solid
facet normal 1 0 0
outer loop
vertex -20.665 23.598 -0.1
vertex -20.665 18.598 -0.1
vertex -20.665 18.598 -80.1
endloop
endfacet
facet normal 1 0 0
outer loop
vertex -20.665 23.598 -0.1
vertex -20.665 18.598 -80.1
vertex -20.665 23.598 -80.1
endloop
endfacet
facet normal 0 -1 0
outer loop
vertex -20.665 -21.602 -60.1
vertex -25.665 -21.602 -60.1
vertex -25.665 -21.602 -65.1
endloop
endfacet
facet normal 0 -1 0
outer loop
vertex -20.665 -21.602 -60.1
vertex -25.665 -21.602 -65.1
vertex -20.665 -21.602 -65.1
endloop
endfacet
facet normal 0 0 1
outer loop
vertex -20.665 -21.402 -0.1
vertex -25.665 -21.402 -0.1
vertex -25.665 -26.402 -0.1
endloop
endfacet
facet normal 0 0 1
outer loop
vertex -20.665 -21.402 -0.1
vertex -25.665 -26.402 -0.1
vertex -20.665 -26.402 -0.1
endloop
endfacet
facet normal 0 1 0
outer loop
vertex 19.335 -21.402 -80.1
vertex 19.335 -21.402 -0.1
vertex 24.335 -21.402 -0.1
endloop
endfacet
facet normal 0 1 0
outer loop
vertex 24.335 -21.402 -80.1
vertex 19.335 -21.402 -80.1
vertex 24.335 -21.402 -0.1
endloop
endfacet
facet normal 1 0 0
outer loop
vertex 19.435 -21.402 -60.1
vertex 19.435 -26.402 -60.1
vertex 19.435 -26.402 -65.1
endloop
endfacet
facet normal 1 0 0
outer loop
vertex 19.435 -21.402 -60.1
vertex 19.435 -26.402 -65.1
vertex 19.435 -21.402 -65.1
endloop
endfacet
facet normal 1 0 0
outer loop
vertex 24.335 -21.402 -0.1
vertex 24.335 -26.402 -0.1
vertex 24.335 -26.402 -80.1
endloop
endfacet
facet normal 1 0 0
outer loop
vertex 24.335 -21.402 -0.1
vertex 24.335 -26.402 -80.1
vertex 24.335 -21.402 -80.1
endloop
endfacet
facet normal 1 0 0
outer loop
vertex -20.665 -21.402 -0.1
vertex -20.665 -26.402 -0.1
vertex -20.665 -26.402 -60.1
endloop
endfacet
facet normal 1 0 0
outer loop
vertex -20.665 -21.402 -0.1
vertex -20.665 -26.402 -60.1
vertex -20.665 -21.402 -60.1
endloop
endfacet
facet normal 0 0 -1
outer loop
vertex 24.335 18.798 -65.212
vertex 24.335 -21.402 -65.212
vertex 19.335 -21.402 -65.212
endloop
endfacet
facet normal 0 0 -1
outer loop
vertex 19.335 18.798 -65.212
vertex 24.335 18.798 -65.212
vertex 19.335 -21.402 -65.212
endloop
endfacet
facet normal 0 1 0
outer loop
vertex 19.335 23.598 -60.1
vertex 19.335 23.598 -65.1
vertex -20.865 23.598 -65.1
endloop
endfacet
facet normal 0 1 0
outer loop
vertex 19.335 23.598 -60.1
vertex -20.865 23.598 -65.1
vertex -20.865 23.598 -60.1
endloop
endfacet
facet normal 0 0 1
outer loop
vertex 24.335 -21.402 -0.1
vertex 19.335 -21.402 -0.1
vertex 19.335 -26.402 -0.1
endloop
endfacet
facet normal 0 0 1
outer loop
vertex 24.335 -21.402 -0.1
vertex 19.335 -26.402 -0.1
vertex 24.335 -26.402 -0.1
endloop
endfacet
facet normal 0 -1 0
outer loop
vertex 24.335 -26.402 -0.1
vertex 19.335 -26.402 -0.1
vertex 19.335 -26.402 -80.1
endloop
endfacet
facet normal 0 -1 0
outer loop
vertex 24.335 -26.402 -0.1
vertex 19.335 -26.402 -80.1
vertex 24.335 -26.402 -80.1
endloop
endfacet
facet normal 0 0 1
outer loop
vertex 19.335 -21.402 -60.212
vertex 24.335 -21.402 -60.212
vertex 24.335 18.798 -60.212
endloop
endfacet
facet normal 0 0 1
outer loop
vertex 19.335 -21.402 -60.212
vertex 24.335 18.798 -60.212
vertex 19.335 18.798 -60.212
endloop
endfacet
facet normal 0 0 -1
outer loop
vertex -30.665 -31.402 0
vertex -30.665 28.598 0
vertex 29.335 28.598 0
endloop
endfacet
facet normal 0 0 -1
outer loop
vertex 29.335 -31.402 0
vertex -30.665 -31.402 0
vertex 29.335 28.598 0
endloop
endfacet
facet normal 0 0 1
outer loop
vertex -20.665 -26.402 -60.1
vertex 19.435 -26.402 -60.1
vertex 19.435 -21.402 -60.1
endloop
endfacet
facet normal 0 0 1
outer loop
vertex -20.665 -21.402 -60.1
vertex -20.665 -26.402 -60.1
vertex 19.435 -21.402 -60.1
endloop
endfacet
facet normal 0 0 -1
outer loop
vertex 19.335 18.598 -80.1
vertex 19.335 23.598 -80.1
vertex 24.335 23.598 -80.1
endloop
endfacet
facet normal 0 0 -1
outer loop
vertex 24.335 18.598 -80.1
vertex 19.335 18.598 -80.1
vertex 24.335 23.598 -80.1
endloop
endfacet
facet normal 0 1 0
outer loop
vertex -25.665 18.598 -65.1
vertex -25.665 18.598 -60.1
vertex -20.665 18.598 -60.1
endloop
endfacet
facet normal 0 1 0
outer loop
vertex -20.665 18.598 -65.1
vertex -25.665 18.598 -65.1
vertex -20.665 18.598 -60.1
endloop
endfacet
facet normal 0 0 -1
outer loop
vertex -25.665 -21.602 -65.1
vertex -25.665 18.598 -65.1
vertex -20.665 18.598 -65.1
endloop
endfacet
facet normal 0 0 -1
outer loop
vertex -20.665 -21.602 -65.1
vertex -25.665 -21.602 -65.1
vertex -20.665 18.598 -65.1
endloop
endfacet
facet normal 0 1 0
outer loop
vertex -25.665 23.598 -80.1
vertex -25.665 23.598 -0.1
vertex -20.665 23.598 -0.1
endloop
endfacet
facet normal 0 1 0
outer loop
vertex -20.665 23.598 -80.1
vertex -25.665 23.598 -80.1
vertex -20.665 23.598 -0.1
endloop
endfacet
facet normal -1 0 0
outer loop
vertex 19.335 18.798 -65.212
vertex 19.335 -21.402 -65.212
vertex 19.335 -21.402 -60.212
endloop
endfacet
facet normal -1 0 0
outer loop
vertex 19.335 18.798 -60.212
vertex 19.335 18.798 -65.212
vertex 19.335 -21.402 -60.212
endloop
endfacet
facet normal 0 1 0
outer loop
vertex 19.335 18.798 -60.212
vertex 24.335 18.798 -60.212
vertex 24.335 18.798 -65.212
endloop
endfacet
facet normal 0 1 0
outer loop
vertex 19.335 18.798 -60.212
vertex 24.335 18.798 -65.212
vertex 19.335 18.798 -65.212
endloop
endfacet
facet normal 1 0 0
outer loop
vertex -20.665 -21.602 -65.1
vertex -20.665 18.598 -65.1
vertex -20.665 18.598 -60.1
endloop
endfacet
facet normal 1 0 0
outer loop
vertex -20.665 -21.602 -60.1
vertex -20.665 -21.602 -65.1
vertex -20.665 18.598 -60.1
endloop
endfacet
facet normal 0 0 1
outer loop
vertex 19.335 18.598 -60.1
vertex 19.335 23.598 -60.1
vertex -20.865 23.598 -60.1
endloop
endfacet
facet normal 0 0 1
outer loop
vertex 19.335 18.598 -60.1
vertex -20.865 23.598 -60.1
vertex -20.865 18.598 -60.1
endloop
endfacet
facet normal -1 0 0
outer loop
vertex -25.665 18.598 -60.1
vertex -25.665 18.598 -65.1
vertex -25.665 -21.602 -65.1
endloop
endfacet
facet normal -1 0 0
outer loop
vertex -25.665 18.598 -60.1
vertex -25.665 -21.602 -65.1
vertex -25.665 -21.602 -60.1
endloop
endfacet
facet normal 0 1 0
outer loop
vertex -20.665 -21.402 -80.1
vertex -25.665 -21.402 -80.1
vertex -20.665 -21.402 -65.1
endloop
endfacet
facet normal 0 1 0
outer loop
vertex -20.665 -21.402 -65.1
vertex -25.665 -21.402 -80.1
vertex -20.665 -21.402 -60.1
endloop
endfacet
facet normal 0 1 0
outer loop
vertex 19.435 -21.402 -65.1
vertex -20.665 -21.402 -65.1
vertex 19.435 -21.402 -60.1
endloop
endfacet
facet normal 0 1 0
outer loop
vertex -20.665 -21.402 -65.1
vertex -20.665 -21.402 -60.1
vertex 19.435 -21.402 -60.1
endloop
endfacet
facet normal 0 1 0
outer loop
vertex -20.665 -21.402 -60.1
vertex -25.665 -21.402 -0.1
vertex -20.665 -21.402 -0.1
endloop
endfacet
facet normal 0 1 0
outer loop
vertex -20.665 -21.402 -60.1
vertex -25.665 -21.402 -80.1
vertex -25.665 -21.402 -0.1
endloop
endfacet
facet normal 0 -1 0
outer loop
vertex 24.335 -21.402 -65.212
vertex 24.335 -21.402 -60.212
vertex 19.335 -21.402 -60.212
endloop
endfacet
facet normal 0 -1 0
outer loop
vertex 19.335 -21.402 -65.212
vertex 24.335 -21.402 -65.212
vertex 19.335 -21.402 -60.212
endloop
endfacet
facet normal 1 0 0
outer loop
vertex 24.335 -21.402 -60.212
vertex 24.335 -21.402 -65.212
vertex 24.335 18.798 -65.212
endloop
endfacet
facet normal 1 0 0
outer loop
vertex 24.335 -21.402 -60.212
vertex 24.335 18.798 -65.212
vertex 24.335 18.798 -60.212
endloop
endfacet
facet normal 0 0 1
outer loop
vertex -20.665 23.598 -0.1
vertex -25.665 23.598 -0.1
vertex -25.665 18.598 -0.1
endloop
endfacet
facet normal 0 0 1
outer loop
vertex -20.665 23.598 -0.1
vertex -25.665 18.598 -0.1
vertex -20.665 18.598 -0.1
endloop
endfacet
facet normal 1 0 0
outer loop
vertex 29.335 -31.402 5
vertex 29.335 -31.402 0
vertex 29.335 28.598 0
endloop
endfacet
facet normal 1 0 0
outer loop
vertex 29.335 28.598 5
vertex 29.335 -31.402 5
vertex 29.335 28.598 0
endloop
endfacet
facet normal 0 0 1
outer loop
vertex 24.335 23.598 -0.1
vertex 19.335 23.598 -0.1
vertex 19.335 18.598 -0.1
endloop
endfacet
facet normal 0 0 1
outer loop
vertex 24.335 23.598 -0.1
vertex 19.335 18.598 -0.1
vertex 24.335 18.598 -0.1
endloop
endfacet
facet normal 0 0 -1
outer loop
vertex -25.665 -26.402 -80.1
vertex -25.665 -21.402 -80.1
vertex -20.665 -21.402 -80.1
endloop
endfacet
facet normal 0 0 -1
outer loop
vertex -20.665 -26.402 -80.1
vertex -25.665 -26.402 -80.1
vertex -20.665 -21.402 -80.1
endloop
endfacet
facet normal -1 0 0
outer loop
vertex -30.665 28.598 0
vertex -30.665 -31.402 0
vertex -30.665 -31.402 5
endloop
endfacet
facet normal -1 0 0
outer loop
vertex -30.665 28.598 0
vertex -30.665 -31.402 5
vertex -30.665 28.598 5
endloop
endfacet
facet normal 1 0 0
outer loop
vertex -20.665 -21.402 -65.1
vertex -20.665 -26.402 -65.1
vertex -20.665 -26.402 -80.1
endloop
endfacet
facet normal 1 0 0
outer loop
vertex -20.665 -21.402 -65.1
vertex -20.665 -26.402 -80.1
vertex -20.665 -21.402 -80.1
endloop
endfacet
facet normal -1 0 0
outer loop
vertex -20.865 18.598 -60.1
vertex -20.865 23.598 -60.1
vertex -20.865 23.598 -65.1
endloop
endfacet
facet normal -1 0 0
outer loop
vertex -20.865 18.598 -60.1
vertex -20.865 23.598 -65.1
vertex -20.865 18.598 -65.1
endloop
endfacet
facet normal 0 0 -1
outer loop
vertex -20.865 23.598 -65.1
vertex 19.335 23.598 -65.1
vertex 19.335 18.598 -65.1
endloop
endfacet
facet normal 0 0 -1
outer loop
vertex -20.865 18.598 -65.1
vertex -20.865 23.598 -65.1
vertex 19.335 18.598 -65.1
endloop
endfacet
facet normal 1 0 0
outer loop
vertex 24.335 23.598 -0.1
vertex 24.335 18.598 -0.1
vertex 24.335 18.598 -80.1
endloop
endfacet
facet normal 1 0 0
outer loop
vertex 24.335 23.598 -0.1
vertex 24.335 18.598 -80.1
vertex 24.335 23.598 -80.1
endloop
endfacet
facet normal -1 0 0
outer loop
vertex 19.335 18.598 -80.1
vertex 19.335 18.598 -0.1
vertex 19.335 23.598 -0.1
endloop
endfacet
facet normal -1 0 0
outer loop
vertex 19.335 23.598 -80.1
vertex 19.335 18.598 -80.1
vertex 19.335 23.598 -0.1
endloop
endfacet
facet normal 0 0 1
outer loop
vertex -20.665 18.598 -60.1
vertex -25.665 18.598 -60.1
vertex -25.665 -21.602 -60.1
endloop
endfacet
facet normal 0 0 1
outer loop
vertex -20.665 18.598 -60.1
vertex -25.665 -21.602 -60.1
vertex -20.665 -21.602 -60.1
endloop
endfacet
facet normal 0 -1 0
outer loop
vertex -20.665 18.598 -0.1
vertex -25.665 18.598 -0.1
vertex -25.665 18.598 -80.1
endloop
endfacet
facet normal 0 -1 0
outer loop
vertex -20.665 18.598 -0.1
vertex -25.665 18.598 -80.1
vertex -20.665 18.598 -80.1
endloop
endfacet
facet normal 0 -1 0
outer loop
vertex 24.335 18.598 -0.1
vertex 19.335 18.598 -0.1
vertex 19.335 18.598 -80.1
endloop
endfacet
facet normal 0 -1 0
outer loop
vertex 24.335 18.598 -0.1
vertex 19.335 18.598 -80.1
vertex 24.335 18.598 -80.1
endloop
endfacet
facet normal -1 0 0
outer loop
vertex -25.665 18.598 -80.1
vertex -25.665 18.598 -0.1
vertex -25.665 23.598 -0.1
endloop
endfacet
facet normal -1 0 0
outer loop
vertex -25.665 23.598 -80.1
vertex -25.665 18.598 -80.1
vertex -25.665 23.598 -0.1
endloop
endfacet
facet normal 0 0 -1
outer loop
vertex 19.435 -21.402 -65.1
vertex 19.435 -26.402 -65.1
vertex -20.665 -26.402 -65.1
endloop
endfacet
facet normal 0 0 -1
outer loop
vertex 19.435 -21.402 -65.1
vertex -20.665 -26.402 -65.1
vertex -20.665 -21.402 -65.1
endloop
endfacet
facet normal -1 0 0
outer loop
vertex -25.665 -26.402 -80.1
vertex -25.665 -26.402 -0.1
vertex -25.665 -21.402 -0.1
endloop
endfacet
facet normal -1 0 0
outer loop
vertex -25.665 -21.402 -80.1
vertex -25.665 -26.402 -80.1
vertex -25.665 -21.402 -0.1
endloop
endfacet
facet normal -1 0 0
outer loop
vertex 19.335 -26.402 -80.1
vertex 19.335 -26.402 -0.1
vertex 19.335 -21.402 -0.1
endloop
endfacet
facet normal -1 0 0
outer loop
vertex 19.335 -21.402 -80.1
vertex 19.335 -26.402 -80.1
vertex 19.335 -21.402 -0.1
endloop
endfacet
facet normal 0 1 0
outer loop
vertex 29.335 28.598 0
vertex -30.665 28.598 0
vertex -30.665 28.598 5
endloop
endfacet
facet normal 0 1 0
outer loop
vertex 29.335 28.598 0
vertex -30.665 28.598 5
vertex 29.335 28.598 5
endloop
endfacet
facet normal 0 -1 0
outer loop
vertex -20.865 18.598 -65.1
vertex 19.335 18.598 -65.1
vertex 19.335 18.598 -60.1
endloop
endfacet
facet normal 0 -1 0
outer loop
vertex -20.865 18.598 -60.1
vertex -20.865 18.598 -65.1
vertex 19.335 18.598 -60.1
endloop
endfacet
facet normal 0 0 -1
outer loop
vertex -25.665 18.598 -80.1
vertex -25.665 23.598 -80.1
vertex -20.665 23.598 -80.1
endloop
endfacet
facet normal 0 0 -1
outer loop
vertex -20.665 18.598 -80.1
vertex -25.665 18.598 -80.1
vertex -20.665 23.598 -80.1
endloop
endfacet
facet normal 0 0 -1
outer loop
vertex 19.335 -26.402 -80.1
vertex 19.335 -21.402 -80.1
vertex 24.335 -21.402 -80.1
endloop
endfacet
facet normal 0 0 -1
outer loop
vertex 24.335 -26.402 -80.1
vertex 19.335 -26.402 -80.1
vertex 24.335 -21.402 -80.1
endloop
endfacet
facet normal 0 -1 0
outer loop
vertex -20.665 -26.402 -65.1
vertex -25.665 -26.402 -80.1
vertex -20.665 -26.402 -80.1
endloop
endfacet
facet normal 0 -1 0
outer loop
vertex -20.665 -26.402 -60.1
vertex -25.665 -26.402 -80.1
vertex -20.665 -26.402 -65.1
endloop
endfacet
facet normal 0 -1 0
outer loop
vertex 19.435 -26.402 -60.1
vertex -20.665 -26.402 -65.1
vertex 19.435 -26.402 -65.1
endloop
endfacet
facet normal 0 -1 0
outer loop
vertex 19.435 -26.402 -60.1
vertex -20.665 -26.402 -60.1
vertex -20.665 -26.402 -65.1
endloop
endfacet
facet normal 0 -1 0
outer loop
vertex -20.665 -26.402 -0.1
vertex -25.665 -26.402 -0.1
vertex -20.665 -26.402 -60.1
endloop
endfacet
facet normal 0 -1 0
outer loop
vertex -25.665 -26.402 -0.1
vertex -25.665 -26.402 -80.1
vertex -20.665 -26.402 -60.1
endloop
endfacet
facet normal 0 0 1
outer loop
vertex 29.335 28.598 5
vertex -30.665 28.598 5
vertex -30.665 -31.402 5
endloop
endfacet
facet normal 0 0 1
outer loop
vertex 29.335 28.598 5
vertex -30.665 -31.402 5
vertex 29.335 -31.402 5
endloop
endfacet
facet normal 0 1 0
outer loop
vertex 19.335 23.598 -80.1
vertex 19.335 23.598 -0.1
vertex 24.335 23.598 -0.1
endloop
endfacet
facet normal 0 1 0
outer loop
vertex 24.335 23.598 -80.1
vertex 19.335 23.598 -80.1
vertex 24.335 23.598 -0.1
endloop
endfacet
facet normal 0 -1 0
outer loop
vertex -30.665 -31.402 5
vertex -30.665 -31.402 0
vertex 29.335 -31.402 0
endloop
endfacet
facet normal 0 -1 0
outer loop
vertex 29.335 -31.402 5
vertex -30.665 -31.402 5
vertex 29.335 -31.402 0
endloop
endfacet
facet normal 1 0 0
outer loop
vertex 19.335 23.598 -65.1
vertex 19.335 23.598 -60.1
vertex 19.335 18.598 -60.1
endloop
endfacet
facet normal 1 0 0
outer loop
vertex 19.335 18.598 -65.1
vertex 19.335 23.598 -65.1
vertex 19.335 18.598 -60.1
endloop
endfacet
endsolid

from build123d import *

# Parameters (mm, degrees)
F0_W      = 60
F0_H      = 60
F1_DEPTH  = 5
F3_W      = 5
F3_H      = 5
F4_DEPTH  = 80
F5_DEPTH  = 80
F6_DEPTH  = 80
F7_W      = 5
F7_H      = 5.0002082646
F8_DEPTH  = 40.1
F9_W      = 5
F9_H      = 5
F10_DEPTH = 40.2
F11_W     = 5
F11_H     = 5
F12_DEPTH = 40.2
F13_W     = 5
F13_H     = 5
F14_DEPTH = 40.2


with BuildPart() as f1:
    # F0 (on Top) → F1 (new body)
    with BuildSketch(Plane.XY):
        with Locations((-0.6647109985, -1.4024986219)):
            Rectangle(F0_W, F0_H)
    extrude(amount=F1_DEPTH)


with BuildPart() as f4:
    # F3 (on offset) → F4 (new body)
    with BuildSketch(Plane.XY.offset(-0.1)):
        with Locations((-23.1647109985, -23.9024986219)):
            Rectangle(F3_W, F3_H)
    extrude(amount=-F4_DEPTH)

    # F7 (on face) → F8 (join)
    with BuildSketch(Plane.YZ.offset(-20.6647109985)):
        with Locations((-23.9024986219, -62.5998958677)):
            Rectangle(F7_W, F7_H)
    extrude(amount=F8_DEPTH)


with BuildPart() as f5:
    # F3 (on offset) → F5 (new body)
    with BuildSketch(Plane.XY.offset(-0.1)):
        with Locations((21.8352890015, -23.9024986219)):
            Rectangle(F3_W, F3_H)
    extrude(amount=-F5_DEPTH)


with BuildPart() as f6:
    # F3 (on offset) → F6 (new body)
    with BuildSketch(Plane.XY.offset(-0.1)):
        with Locations((21.8352890015, 21.0975013781)):
            Rectangle(F3_W, F3_H)
    extrude(amount=-F6_DEPTH)


with BuildPart() as f6b:
    # F3 (on offset) → F6, piece 2 (new body)
    with BuildSketch(Plane.XY.offset(-0.1)):
        with Locations((-23.1647109985, 21.0975013781)):
            Rectangle(F3_W, F3_H)
    extrude(amount=-F6_DEPTH)


with BuildPart() as f10:
    # F9 (on face) → F10 (new body)
    with BuildSketch(Plane(origin=(0, -21.4024986219, 0), x_dir=(-1, 0, 0), z_dir=(0, 1, 0))):
        with Locations((-21.8352890015, -62.712443471)):
            Rectangle(F9_W, F9_H)
    extrude(amount=F10_DEPTH)


with BuildPart() as f12:
    # F11 (on face) → F12 (new body)
    with BuildSketch(Plane(origin=(19.3352890015, 0, 0), x_dir=(0, -1, 0), z_dir=(-1, 0, 0))):
        with Locations((-21.0975013781, -62.6)):
            Rectangle(F11_W, F11_H)
    extrude(amount=F12_DEPTH)


with BuildPart() as f14:
    # F13 (on face) → F14 (new body)
    with BuildSketch(Plane.XZ.offset(-18.5975013781)):
        with Locations((-23.1647109985, -62.6)):
            Rectangle(F13_W, F13_H)
    extrude(amount=F14_DEPTH)


solid = Compound([f1.part, f4.part, f5.part, f6.part, f6b.part, f10.part, f12.part, f14.part])
